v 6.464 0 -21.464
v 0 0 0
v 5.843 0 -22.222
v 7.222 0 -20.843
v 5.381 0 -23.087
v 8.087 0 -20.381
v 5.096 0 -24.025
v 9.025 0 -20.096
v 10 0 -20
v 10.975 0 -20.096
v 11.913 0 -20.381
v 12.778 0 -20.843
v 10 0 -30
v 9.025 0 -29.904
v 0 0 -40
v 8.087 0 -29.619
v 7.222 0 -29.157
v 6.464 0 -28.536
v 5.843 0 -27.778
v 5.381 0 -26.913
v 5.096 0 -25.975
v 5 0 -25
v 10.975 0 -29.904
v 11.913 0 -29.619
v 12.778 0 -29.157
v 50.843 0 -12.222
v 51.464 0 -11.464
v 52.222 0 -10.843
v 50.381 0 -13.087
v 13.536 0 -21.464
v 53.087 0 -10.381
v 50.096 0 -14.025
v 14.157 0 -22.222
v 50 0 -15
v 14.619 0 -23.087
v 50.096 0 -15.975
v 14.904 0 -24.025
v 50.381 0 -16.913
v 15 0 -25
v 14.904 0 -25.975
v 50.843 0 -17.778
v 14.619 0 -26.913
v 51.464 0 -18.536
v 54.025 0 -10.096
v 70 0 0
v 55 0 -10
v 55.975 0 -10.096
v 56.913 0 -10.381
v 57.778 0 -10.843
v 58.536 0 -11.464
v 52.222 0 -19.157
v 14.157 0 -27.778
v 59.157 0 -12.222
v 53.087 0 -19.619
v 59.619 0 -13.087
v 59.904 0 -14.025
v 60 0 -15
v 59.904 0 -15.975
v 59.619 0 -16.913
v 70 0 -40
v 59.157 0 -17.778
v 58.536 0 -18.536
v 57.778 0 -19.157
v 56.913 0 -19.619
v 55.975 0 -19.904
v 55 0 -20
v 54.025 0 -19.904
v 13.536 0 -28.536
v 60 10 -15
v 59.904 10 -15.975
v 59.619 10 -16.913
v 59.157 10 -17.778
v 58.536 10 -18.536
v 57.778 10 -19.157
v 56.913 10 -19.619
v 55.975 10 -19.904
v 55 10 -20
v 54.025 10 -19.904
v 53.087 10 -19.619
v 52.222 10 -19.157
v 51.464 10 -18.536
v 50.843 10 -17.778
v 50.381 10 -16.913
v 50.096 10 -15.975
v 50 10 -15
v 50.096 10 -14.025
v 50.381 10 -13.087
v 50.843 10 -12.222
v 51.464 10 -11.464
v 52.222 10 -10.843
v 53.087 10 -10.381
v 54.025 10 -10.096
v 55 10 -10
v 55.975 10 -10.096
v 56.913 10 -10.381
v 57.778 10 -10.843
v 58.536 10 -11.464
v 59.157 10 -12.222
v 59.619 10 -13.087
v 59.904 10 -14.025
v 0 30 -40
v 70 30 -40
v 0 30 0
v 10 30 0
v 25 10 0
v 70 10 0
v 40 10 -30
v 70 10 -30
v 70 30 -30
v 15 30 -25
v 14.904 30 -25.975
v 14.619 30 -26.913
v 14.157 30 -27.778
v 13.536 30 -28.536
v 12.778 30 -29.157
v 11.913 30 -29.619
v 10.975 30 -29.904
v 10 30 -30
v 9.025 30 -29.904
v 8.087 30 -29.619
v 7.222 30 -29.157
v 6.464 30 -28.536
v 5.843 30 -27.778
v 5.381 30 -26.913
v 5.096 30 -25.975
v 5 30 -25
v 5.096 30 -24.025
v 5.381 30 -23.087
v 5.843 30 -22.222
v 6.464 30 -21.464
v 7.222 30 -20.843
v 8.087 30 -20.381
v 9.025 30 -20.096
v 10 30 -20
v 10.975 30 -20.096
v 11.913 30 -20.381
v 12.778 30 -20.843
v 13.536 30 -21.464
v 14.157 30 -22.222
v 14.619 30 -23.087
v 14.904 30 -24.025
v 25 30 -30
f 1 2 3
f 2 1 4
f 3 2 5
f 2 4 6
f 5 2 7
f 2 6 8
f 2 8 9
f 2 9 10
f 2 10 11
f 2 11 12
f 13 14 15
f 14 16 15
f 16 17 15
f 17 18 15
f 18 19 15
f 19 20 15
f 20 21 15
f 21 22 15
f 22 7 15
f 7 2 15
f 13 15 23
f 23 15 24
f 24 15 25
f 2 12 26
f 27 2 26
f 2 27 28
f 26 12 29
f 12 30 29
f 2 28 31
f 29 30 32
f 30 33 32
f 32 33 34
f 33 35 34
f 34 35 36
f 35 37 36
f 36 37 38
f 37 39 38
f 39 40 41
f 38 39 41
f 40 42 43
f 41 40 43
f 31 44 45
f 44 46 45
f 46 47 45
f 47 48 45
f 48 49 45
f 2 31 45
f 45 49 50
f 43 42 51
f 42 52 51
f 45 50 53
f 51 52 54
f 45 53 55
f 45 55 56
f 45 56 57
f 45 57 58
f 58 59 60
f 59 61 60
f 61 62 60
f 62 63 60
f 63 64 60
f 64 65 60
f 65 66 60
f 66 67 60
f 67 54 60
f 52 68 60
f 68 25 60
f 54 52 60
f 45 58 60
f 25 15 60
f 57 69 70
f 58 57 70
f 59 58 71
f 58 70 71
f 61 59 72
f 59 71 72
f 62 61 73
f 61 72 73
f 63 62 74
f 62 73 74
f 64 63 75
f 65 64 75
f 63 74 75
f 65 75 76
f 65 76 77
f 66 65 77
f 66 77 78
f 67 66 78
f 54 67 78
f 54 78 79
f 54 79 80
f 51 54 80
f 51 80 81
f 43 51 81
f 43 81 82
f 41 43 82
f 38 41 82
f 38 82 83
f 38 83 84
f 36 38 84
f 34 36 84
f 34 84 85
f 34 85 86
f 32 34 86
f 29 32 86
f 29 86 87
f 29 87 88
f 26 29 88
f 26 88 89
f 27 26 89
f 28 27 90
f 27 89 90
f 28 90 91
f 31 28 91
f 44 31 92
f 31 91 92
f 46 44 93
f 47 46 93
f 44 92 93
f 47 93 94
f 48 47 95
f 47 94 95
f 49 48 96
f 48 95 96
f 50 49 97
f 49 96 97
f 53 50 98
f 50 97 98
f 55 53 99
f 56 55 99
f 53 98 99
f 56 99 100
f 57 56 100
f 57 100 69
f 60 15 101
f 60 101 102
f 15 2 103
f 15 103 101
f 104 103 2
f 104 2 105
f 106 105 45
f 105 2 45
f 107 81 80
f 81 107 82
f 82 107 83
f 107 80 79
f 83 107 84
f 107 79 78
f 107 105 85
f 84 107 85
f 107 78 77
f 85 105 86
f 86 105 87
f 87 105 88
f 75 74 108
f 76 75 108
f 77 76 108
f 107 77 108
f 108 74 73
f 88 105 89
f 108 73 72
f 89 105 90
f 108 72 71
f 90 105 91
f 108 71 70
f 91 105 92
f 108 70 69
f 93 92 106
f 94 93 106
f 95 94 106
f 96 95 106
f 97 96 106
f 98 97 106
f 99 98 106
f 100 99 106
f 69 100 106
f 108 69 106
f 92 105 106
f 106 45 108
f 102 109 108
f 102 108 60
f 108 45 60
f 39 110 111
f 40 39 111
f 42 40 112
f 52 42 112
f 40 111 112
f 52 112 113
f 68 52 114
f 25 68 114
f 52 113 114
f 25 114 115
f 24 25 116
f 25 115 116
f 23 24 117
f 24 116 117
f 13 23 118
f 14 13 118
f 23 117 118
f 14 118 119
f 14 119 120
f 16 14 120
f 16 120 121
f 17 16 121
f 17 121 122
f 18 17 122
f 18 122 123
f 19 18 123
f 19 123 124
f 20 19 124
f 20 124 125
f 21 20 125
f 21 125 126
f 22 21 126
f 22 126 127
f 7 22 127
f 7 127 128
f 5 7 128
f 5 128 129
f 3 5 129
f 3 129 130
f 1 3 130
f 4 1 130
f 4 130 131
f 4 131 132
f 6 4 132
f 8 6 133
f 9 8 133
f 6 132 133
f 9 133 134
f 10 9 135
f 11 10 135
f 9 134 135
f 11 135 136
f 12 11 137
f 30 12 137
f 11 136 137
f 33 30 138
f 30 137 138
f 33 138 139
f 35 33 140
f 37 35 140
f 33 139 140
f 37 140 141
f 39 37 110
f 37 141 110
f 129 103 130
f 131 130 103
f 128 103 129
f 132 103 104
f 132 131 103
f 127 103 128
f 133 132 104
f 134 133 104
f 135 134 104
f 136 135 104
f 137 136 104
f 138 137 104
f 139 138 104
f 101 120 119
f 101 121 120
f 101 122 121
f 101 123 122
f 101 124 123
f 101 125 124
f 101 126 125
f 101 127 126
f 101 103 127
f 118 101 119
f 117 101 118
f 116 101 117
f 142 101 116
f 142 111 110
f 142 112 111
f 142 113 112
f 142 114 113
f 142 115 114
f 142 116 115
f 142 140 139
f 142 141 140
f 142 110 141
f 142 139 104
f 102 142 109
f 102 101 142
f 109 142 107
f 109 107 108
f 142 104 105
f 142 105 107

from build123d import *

# Parameters (mm, degrees)
SKETCH1_W           = 70
SKETCH1_H           = 40
BOSS_EXTRUDE1_DEPTH = 30
SKETCH2_W           = 30
SKETCH2_H           = 20
CUT_EXTRUDE1_DEPTH  = 30
CUT_EXTRUDE2_DEPTH  = 36
CUT_EXTRUDE3_DEPTH  = 49
CUT_EXTRUDE5_DEPTH  = 21
SKETCH11_R          = 5
CUT_EXTRUDE6_DEPTH  = 11
SKETCH12_R          = 5
CUT_EXTRUDE7_DEPTH  = 31


with BuildPart() as part:
    # Sketch1 → Boss-Extrude1 (new body)
    with BuildSketch(Plane(origin=(0, 0, 0), x_dir=(1, 0, 0), z_dir=(0, 1, 0))):
        with Locations((35, 20)):
            Rectangle(SKETCH1_W, SKETCH1_H)
    extrude(amount=BOSS_EXTRUDE1_DEPTH)

    # Sketch2 → Cut-Extrude1 (cut)
    with BuildSketch(Plane.XY):
        with Locations((55, 20)):
            Rectangle(SKETCH2_W, SKETCH2_H)
    extrude(amount=-CUT_EXTRUDE1_DEPTH, mode=Mode.SUBTRACT)

    # Sketch8 → Cut-Extrude2 (cut)
    with BuildSketch(Plane(origin=(17.931034483, 13.448275862, 8.965517241), x_dir=(0.297112541, 0.222834406, -0.928476691), z_dir=(0.742781353, 0.557086015, 0.371390676))):
        Polygon((9.656157585, 18), (9.656157585, -7), (41.967146428, -16), (41.967146428, 9), align=None)
    extrude(amount=CUT_EXTRUDE2_DEPTH, mode=Mode.SUBTRACT)

    # Sketch9 → Cut-Extrude3 (cut)
    with BuildSketch(Plane.XY.offset(-30)):
        Polygon((25, 30), (40, 10), (40, 30), align=None)
    extrude(amount=CUT_EXTRUDE3_DEPTH, mode=Mode.SUBTRACT)

    # Sketch10 → Cut-Extrude5 (cut)
    with BuildSketch(Plane(origin=(0, 10, 0), x_dir=(1, 0, 0), z_dir=(0, 1, 0))):
        Polygon((25, 0), (40, 0), (40, 30), align=None)
    extrude(amount=CUT_EXTRUDE5_DEPTH, mode=Mode.SUBTRACT)

    # Sketch11 → Cut-Extrude6 (cut, through all)
    with BuildSketch(Plane(origin=(0, 10, 0), x_dir=(1, 0, 0), z_dir=(0, 1, 0))):
        with Locations((55, 15)):
            Circle(SKETCH11_R)
    extrude(amount=-CUT_EXTRUDE6_DEPTH, mode=Mode.SUBTRACT)

    # Sketch12 → Cut-Extrude7 (cut, through all)
    with BuildSketch(Plane(origin=(0, 30, 0), x_dir=(1, 0, 0), z_dir=(0, 1, 0))):
        with Locations((10, 25)):
            Circle(SKETCH12_R)
    extrude(amount=-CUT_EXTRUDE7_DEPTH, mode=Mode.SUBTRACT)


solid = part.part
